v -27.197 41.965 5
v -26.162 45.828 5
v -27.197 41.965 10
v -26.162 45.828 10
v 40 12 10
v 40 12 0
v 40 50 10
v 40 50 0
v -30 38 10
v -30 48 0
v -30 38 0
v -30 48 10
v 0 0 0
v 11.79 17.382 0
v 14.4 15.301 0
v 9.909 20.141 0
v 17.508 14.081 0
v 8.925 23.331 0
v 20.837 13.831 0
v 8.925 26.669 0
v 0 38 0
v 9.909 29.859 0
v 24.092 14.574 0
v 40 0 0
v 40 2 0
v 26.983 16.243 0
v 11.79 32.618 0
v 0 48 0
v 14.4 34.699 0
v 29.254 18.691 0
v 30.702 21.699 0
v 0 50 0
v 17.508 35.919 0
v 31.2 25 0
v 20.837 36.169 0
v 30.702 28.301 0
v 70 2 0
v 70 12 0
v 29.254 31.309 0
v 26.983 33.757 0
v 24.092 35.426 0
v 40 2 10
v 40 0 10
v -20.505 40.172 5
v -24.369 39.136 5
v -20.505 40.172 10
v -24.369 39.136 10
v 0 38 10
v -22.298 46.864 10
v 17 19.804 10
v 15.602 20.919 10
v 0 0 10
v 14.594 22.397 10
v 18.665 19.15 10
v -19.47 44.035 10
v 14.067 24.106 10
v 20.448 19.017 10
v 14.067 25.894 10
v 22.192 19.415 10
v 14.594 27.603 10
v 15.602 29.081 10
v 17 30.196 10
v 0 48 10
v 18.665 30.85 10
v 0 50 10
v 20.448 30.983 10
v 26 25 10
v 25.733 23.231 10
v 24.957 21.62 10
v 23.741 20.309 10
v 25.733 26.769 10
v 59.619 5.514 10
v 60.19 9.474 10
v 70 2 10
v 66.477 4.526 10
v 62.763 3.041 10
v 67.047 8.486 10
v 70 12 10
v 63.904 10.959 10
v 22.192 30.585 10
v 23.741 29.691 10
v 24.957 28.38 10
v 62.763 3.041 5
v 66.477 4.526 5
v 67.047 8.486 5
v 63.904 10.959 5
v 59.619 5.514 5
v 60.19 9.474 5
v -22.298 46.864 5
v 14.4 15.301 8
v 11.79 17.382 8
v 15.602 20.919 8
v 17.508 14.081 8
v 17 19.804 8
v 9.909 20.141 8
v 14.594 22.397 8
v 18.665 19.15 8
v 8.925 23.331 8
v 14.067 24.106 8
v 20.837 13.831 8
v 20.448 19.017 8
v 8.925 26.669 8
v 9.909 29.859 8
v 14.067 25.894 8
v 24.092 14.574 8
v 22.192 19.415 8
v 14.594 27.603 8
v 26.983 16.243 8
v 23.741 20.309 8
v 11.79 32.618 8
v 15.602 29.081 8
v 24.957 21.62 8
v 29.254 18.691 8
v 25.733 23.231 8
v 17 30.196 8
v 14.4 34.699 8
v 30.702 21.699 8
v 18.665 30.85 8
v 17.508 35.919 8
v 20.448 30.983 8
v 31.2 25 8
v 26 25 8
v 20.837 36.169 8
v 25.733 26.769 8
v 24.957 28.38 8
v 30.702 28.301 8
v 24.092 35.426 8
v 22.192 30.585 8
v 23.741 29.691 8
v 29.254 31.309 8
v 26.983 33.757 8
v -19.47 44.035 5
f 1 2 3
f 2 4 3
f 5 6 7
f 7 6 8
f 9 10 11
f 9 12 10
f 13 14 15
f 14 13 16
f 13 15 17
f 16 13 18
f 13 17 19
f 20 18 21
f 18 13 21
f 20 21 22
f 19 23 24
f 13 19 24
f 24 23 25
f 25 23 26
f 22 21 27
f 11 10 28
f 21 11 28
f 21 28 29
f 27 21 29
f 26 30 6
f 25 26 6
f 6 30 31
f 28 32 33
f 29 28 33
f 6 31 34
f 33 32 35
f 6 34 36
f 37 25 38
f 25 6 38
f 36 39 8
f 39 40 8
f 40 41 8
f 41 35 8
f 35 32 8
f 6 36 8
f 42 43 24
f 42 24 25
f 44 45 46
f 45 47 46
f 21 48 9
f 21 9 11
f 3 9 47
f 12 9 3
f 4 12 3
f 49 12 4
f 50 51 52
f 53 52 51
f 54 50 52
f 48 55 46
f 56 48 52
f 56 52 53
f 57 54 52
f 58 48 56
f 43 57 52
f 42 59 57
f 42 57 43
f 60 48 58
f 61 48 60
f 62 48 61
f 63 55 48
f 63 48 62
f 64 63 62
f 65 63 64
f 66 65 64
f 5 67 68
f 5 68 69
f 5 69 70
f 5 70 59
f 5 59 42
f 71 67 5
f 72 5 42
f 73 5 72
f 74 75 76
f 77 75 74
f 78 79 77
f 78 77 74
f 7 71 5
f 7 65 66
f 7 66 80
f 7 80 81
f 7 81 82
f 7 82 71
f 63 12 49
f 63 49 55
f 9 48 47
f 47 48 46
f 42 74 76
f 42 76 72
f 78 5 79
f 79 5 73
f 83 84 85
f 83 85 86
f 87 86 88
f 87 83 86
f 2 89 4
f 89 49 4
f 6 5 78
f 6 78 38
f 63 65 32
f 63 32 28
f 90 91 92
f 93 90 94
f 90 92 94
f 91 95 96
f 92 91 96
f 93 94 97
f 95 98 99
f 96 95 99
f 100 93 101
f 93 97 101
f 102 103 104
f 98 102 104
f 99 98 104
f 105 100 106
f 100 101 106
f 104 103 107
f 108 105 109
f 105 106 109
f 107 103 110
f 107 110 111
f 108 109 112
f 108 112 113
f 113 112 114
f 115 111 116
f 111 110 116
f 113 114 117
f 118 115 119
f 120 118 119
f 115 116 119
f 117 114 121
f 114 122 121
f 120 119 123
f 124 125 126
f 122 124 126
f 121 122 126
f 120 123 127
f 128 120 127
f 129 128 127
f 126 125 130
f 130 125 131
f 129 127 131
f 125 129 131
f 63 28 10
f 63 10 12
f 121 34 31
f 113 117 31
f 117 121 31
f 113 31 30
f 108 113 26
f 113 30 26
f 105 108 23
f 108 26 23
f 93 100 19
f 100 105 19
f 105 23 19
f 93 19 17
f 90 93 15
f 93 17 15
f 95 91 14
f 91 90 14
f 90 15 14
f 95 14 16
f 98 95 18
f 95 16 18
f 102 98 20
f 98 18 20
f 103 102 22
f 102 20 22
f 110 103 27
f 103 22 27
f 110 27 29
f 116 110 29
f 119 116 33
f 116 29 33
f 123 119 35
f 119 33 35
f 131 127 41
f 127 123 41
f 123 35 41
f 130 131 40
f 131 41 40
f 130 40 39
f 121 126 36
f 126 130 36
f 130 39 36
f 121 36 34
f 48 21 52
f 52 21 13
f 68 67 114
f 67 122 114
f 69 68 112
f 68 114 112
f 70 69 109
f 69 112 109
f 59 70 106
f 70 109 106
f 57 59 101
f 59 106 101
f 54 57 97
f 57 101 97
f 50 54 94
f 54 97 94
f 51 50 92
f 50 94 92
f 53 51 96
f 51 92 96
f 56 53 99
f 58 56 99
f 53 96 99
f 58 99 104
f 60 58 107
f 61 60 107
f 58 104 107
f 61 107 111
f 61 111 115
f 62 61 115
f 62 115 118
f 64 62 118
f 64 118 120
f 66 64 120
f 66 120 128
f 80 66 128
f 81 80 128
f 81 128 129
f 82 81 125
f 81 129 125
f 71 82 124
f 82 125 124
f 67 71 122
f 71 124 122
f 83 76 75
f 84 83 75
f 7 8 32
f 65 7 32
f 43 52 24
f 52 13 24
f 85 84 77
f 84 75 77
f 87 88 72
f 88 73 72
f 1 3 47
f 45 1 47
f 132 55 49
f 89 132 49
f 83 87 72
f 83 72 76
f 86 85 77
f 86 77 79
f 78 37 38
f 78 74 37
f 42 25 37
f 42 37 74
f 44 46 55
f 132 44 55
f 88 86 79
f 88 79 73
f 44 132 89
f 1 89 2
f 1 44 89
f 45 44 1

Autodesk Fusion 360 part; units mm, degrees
sketch "Top" plane through (0, 0, 0) normal (0, 0, 1) x (1, 0, 0)
  line L0 (0, 0) -> (40, 0)
  line L1 (40, 0) -> (40, 50)
  line L2 (40, 50) -> (0, 50)
  line L3 (0, 50) -> (0, 0)
  circle A0 centre (20, 25) radius 11.2
  circle A1 centre (20, 25) radius 6
  dimension "d6" = 40
  dimension "d7" = 50
  dimension "d11" = 22.4
  dimension "d12" = 25
  dimension "d13" = 20
  dimension "d27" = 12
extrude "Extrude1" add sketch "Top" along normal blind 10 contours L0 L1 L2 L3 | A0 | A1
extrude "Extrude2" cut sketch "Top" along normal blind 8 contours A0 | A1
extrude "Extrude5" cut sketch "Top" along normal blind 110 contours A1
sketch "Sketch5" plane through (0, 0, 0) normal (-1, 0, 0) x (0, -1, 0)
  line L0 (-50, 0) -> (0, 0)
  line L1 (0, 0) -> (0, 10)
  line L2 (0, 10) -> (-50, 10)
  line L3 (-50, 10) -> (-50, 0)
  line L4 (-48, 10) -> (-38, 10)
  line L5 (-38, 10) -> (-38, 0)
  line L6 (-38, 0) -> (-48, 0)
  line L7 (-48, 0) -> (-48, 10)
  dimension "d50" = 10
  dimension "d51" = 10
  dimension "d52" = 2
extrude "Extrude8" add sketch "Sketch5" along normal blind 30 contours L0 L2 L4 L5 L6 L7
sketch "Sketch8" plane through (40, 0, 0) normal (1, 0, 0) x (0, 1, 0)
  line L0 (0, 0) -> (50, 0)
  line L1 (50, 0) -> (50, 10)
  line L2 (50, 10) -> (0, 10)
  line L3 (0, 10) -> (0, 0)
  line L4 (2, 10) -> (12, 10)
  line L5 (12, 10) -> (12, 0)
  line L6 (12, 0) -> (2, 0)
  line L7 (2, 0) -> (2, 10)
  dimension "d72" = 10
  dimension "d73" = 10
  dimension "d74" = 2
extrude "Extrude11" add sketch "Sketch8" along normal blind 30 contours L0 L2 L4 L5 L6 L7
sketch "Sketch10" plane through (0, 0, 10) normal (0, 0, 1) x (-1, 0, 0)
  circle A0 centre (-20, -25) radius 6
  line L0 (0, -50) -> (0, -48)
  line L1 (0, -48) -> (30, -48)
  line L2 (30, -48) -> (30, -38)
  line L3 (30, -38) -> (0, -38)
  line L4 (0, -38) -> (0, 0)
  line L5 (0, 0) -> (-40, 0)
  line L6 (-40, 0) -> (-40, -2)
  line L7 (-40, -2) -> (-70, -2)
  line L8 (-70, -2) -> (-70, -12)
  line L9 (-70, -12) -> (-40, -12)
  line L10 (-40, -12) -> (-40, -50)
  line L11 (-40, -50) -> (0, -50)
  line L12 (20.5049, -40.1716) -> (19.4696, -44.0353)
  line L13 (19.4696, -44.0353) -> (22.2981, -46.8637)
  line L14 (22.2981, -46.8637) -> (26.1618, -45.8284)
  line L15 (26.1618, -45.8284) -> (27.197, -41.9647)
  line L16 (27.197, -41.9647) -> (24.3686, -39.1363)
  line L17 (24.3686, -39.1363) -> (20.5049, -40.1716)
  line L18 (-67.0472, -8.4856) -> (-63.9038, -10.9591)
  line L19 (-63.9038, -10.9591) -> (-60.1898, -9.4736)
  line L20 (-60.1898, -9.4736) -> (-59.6194, -5.5144)
  line L21 (-59.6194, -5.5144) -> (-62.7629, -3.0409)
  line L22 (-62.7629, -3.0409) -> (-66.4768, -4.5264)
  line L23 (-66.4768, -4.5264) -> (-67.0472, -8.4856)
  point P0 (23.3333, -43)
  point P1 (-63.3333, -7)
  dimension "d93" = 4
  dimension "d94" = 5
  dimension "d95" = 6.6667
  dimension "d96" = 4
  dimension "d97" = 6.6667
  dimension "d98" = 5
extrude "Extrude13" cut sketch "Sketch10" against normal blind 5 contours L12 L13 L14 L15 L16 L17 | L18 L19 L20 L21 L22 L23
equation "length = 50 mm"
equation "width = 40 mm"
equation "thickness = 10 mm"
equation "extra = 100 mm"
equation "fit_gap = 0.2 mm"
equation "d6 = width"
equation "d7 = length"
equation "d8 = thickness"
equation "bearing_outer_radius = 11.1 mm"
equation "d11 = ( bearing_outer_radius * 2 ) + fit_gap"
equation "d12 = length / 2"
equation "d13 = width / 2"
equation "d14 = thickness - 2 mm"
equation "bearing_inner_radius = ( 8 mm + 4 mm ) / 2"
equation "d27 = bearing_inner_radius * 2"
equation "d28 = thickness + extra"
equation "rack_rock_bracket_length = 30 mm"
equation "rack_rock_bracket_width = 10 mm"
equation "rack_rock_bracket_big_distance = 2 mm"
equation "d50 = rack_rock_bracket_width"
equation "d51 = rack_rock_bracket_width"
equation "d52 = rack_rock_bracket_big_distance"
equation "d53 = rack_rock_bracket_length"
equation "d72 = rack_rock_bracket_width"
equation "d73 = rack_rock_bracket_width"
equation "d74 = rack_rock_bracket_big_distance"
equation "d75 = rack_rock_bracket_length"
equation "bearing_dowel_radius = 0.8 mm"
equation "bearing_dowel_length = 10 mm"
equation "bearing_dowel_big_distance = 2 mm + bearing_dowel_radius"
equation "bearing_dowel_small_distance = rack_rock_bracket_width / 2"
equation "polygon_dowel_hole_side_length = 4 mm"
equation "polygon_dowel_hole_height = 5 mm"
equation "polygon_dowel_small_distance = thickness / 2"
equation "polygon_dowel_big_distance = polygon_dowel_small_distance + ( polygon_dowel_small_distance / 3 )"
equation "d93 = polygon_dowel_hole_side_length"
equation "d94 = polygon_dowel_small_distance"
equation "d95 = polygon_dowel_big_distance"
equation "d96 = polygon_dowel_hole_side_length"
equation "d97 = polygon_dowel_big_distance"
equation "d98 = polygon_dowel_small_distance"
equation "d99 = -polygon_dowel_hole_height"
